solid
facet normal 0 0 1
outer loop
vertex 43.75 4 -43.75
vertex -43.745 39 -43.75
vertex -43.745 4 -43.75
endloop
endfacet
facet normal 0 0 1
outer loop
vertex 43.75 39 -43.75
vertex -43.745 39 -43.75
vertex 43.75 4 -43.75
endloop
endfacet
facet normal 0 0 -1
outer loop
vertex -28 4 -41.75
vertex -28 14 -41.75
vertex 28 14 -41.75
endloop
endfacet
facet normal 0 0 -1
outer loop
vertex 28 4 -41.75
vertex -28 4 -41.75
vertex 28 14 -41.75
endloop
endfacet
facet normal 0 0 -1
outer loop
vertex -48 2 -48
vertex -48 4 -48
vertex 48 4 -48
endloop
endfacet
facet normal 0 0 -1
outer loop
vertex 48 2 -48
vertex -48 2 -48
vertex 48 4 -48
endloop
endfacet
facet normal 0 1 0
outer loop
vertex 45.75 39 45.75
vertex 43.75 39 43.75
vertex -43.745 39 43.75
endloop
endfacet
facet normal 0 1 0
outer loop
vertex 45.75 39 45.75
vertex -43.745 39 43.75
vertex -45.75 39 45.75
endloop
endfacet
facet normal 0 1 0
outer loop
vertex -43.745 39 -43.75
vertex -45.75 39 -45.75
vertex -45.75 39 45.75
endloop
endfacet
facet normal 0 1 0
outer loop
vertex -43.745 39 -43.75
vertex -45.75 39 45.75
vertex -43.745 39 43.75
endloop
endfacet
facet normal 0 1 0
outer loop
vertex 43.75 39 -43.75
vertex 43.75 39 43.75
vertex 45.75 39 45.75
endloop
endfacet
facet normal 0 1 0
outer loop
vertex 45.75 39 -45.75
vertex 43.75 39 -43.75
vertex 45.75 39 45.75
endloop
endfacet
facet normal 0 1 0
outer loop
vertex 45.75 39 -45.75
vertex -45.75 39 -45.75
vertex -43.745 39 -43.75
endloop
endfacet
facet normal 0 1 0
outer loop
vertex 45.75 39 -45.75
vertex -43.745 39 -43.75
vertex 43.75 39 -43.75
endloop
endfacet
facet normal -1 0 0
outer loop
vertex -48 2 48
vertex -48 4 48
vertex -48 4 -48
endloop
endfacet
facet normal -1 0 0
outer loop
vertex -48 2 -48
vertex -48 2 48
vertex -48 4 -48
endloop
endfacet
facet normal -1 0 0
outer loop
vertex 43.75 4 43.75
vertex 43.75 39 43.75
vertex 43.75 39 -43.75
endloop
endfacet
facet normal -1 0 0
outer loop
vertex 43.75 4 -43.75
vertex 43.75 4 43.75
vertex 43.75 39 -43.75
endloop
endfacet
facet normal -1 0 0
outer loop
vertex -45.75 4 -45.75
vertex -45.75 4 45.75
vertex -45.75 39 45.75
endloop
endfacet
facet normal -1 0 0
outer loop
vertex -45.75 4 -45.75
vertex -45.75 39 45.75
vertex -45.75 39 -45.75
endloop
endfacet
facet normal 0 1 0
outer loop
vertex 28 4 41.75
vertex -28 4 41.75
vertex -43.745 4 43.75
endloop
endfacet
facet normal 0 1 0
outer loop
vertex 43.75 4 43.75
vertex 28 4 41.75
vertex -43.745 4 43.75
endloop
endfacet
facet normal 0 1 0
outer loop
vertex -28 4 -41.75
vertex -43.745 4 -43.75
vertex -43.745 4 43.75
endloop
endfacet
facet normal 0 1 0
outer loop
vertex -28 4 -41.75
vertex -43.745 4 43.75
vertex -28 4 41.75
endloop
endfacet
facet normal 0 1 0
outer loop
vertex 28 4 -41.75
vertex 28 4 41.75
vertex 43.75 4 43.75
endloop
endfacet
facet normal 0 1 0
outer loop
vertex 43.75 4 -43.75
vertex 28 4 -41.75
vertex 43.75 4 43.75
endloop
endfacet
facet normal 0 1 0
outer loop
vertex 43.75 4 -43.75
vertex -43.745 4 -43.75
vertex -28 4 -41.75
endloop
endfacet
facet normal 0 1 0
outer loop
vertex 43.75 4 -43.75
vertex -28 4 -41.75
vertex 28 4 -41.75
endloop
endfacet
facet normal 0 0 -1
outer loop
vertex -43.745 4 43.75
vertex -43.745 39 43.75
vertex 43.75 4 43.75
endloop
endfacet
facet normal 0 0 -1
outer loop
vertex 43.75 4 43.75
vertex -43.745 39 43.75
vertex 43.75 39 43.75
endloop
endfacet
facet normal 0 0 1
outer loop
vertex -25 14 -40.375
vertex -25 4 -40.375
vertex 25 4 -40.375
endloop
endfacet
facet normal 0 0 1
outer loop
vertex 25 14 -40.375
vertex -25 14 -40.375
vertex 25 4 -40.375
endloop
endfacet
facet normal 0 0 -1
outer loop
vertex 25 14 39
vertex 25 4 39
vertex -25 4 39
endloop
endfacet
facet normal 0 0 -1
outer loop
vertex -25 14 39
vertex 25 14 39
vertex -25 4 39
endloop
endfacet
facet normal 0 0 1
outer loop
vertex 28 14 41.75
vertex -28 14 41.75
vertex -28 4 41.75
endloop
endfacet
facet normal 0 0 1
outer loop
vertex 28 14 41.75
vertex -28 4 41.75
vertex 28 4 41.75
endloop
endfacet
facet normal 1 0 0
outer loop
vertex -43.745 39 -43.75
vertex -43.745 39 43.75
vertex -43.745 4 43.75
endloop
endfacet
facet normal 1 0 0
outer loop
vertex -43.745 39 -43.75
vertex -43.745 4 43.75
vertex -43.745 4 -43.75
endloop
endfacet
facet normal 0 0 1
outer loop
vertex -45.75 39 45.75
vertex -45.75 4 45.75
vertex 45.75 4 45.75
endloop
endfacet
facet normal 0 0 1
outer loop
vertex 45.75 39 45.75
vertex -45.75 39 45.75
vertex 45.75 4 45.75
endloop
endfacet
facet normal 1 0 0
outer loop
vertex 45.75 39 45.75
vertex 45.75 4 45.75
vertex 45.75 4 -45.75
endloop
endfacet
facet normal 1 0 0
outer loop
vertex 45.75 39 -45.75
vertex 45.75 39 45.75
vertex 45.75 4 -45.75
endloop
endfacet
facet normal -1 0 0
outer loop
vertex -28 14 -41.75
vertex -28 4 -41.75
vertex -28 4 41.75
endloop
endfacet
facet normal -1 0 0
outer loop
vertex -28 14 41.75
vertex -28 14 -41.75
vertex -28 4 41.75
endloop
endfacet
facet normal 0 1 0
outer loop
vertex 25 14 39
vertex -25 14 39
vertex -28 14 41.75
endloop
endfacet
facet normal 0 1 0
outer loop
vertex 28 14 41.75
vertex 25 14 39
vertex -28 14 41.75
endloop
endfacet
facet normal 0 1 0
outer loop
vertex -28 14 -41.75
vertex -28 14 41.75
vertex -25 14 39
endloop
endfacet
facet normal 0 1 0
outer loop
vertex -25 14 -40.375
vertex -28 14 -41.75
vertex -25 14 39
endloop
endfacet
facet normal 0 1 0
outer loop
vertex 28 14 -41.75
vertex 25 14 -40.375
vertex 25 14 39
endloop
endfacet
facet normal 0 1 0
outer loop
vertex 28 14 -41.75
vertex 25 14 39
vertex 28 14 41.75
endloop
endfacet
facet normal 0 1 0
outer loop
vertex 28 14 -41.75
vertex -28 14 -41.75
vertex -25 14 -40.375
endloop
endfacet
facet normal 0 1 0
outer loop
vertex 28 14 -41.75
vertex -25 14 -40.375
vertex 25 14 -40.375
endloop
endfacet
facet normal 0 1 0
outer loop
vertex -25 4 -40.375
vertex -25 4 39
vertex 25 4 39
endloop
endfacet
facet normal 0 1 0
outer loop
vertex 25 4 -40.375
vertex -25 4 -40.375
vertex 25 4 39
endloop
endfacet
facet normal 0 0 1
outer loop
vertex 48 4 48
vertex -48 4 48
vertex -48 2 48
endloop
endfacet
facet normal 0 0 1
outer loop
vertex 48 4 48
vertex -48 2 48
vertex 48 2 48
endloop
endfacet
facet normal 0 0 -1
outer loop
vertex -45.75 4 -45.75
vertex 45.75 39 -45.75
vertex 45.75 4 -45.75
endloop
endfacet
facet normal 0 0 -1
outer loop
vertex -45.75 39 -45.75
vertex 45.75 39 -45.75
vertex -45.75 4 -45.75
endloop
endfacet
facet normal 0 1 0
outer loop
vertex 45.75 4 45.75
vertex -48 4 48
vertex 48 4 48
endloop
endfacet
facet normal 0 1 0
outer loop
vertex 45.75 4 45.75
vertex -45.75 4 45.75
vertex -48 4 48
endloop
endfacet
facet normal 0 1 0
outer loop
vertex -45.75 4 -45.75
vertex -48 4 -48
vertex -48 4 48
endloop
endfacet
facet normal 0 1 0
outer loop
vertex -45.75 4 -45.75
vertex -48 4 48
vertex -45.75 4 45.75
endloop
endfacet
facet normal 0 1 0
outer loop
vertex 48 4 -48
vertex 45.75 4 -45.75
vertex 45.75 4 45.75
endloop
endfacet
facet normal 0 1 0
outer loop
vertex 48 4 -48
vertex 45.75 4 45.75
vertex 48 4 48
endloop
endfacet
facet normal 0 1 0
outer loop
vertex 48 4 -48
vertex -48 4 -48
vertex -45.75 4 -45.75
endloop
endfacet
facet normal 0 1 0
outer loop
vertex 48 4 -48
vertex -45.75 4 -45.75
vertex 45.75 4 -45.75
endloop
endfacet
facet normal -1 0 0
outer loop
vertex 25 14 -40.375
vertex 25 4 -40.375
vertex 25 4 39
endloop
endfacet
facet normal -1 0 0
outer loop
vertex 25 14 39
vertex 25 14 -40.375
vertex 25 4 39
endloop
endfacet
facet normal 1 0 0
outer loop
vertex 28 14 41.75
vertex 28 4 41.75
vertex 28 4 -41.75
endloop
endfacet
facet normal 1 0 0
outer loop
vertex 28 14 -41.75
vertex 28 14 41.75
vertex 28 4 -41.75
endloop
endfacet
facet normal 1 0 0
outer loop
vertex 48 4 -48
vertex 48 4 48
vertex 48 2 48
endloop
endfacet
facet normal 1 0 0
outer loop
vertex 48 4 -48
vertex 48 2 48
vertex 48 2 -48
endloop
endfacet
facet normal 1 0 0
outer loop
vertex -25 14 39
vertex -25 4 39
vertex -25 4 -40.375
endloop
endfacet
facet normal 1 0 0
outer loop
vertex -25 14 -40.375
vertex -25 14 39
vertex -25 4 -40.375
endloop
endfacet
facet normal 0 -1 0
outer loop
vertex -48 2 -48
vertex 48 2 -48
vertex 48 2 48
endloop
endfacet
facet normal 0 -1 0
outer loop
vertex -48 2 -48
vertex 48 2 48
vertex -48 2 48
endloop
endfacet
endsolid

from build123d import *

# Parameters (mm, degrees)
SKETCH1_W            = 100
SKETCH1_H            = 100
BOSS_EXTRUDE1_DEPTH  = 4
SKETCH2_W            = 91.5
SKETCH2_H            = 91.5
SKETCH2_W_2          = 83.5
SKETCH2_H_2          = 83.5
BOSS_EXTRUDE2_DEPTH  = 35
SKETCH3_W            = 4
SKETCH3_H            = 4
CUT_EXTRUDE1_DEPTH   = 4
SKETCH4_W            = 26
SKETCH4_H            = 2.75
SKETCH4_W_2          = 3
SKETCH4_H_2          = 44.42
BOSS_EXTRUDE3_DEPTH  = 10
SKETCH5_W            = 50
SKETCH5_H            = 1.375
CUT_EXTRUDE2_DEPTH   = 79.89866919
SKETCH7_W            = 4
SKETCH7_H            = 4
BOSS_EXTRUDE5_DEPTH  = 4
SKETCH8_W            = 87.495245403
SKETCH8_H            = 87.5
CUT_EXTRUDE6_DEPTH   = 25
SKETCH10_W           = 87.495245403
SKETCH10_H           = 87.5
SKETCH10_W_2         = 83.5
SKETCH10_H_2         = 83.5
CUT_EXTRUDE8_DEPTH   = 10
SKETCH11_OUTSIDE_W   = 131.34
SKETCH11_OUTSIDE_H   = 131.34
SKETCH11_OUTSIDE_W_2 = 96
SKETCH11_OUTSIDE_H_2 = 96
CUT_EXTRUDE9_DEPTH   = 32
SKETCH12_W           = 96
SKETCH12_H           = 2
CUT_EXTRUDE10_DEPTH  = 115.197197864


with BuildPart() as part:
    # Sketch1 → Boss-Extrude1 (new body)
    with BuildSketch(Plane(origin=(0, 0, 0), x_dir=(1, 0, 0), z_dir=(0, 1, 0))):
        Rectangle(SKETCH1_W, SKETCH1_H)
    extrude(amount=BOSS_EXTRUDE1_DEPTH)

    # Sketch2 → Boss-Extrude2 (add)
    with BuildSketch(Plane(origin=(0, 4, 0), x_dir=(1, 0, 0), z_dir=(0, 1, 0))):
        Rectangle(SKETCH2_W, SKETCH2_H)
        Rectangle(SKETCH2_W_2, SKETCH2_H_2, mode=Mode.SUBTRACT)
    extrude(amount=BOSS_EXTRUDE2_DEPTH)

    # Sketch3 → Cut-Extrude1 (cut)
    with BuildSketch(Plane(origin=(0, 0, -45.75), x_dir=(-1, 0, 0), z_dir=(0, 0, -1))):
        with Locations((0, 6)):
            Rectangle(SKETCH3_W, SKETCH3_H)
    extrude(amount=-CUT_EXTRUDE1_DEPTH, mode=Mode.SUBTRACT)

    # Sketch4 → Boss-Extrude3 (add)
    with BuildSketch(Plane(origin=(0, 4, 0), x_dir=(1, 0, 0), z_dir=(0, 1, 0))):
        Polygon((-28, 22.21), (-25, 22.21), (-25, 39), (-13, 39), (-13, 41.75), (-28, 41.75), align=None)
        Polygon((25, 39), (25, 22.21), (28, 22.21), (28, 41.75), (13, 41.75), (13, 39), align=None)
        Polygon((25, -39), (13, -39), (13, -41.75), (28, -41.75), (28, -22.21), (25, -22.21), align=None)
        Polygon((-13, -39), (-25, -39), (-25, -22.21), (-28, -22.21), (-28, -41.75), (-13, -41.75), align=None)
        with Locations((0, -40.375)):
            Rectangle(SKETCH4_W, SKETCH4_H)
        with Locations((-26.5, 0)):
            Rectangle(SKETCH4_W_2, SKETCH4_H_2)
        with Locations((0, 40.375)):
            Rectangle(SKETCH4_W, SKETCH4_H)
        with Locations((26.5, 0)):
            Rectangle(SKETCH4_W_2, SKETCH4_H_2)
    extrude(amount=BOSS_EXTRUDE3_DEPTH)

    # Sketch5 → Cut-Extrude2 (cut, through all)
    with BuildSketch(Plane(origin=(0, 4, 0), x_dir=(1, 0, 0), z_dir=(0, 1, 0))):
        with Locations((0, 39.6875)):
            Rectangle(SKETCH5_W, SKETCH5_H)
    extrude(amount=CUT_EXTRUDE2_DEPTH, mode=Mode.SUBTRACT)

    # Sketch7 → Boss-Extrude5 (add)
    with BuildSketch(Plane(origin=(0, 0, -45.75), x_dir=(-1, 0, 0), z_dir=(0, 0, -1))):
        with Locations((0, 6)):
            Rectangle(SKETCH7_W, SKETCH7_H)
    extrude(amount=-BOSS_EXTRUDE5_DEPTH)

    # Sketch8 → Cut-Extrude6 (cut)
    with BuildSketch(Plane(origin=(0, 39, 0), x_dir=(1, 0, 0), z_dir=(0, 1, 0))):
        with Locations((0.002377298, 0)):
            Rectangle(SKETCH8_W, SKETCH8_H)
    extrude(amount=-CUT_EXTRUDE6_DEPTH, mode=Mode.SUBTRACT)

    # Sketch10 → Cut-Extrude8 (cut)
    with BuildSketch(Plane(origin=(0, 14, 0), x_dir=(1, 0, 0), z_dir=(0, 1, 0))):
        with Locations((0.002377298, 0)):
            Rectangle(SKETCH10_W, SKETCH10_H)
        Rectangle(SKETCH10_W_2, SKETCH10_H_2, mode=Mode.SUBTRACT)
    extrude(amount=-CUT_EXTRUDE8_DEPTH, mode=Mode.SUBTRACT)

    # Sketch11 outside → Cut-Extrude9 (cut)
    with BuildSketch(Plane(origin=(0, 4, 0), x_dir=(1, 0, 0), z_dir=(0, 1, 0))):
        Rectangle(SKETCH11_OUTSIDE_W, SKETCH11_OUTSIDE_H)
        Rectangle(SKETCH11_OUTSIDE_W_2, SKETCH11_OUTSIDE_H_2, mode=Mode.SUBTRACT)
    extrude(amount=-CUT_EXTRUDE9_DEPTH, mode=Mode.SUBTRACT)

    # Sketch12 → Cut-Extrude10 (cut, through all)
    with BuildSketch(Plane(origin=(0, 0, -48), x_dir=(-1, 0, 0), z_dir=(0, 0, -1))):
        with Locations((0, 1)):
            Rectangle(SKETCH12_W, SKETCH12_H)
    extrude(amount=-CUT_EXTRUDE10_DEPTH, mode=Mode.SUBTRACT)


solid = part.part
